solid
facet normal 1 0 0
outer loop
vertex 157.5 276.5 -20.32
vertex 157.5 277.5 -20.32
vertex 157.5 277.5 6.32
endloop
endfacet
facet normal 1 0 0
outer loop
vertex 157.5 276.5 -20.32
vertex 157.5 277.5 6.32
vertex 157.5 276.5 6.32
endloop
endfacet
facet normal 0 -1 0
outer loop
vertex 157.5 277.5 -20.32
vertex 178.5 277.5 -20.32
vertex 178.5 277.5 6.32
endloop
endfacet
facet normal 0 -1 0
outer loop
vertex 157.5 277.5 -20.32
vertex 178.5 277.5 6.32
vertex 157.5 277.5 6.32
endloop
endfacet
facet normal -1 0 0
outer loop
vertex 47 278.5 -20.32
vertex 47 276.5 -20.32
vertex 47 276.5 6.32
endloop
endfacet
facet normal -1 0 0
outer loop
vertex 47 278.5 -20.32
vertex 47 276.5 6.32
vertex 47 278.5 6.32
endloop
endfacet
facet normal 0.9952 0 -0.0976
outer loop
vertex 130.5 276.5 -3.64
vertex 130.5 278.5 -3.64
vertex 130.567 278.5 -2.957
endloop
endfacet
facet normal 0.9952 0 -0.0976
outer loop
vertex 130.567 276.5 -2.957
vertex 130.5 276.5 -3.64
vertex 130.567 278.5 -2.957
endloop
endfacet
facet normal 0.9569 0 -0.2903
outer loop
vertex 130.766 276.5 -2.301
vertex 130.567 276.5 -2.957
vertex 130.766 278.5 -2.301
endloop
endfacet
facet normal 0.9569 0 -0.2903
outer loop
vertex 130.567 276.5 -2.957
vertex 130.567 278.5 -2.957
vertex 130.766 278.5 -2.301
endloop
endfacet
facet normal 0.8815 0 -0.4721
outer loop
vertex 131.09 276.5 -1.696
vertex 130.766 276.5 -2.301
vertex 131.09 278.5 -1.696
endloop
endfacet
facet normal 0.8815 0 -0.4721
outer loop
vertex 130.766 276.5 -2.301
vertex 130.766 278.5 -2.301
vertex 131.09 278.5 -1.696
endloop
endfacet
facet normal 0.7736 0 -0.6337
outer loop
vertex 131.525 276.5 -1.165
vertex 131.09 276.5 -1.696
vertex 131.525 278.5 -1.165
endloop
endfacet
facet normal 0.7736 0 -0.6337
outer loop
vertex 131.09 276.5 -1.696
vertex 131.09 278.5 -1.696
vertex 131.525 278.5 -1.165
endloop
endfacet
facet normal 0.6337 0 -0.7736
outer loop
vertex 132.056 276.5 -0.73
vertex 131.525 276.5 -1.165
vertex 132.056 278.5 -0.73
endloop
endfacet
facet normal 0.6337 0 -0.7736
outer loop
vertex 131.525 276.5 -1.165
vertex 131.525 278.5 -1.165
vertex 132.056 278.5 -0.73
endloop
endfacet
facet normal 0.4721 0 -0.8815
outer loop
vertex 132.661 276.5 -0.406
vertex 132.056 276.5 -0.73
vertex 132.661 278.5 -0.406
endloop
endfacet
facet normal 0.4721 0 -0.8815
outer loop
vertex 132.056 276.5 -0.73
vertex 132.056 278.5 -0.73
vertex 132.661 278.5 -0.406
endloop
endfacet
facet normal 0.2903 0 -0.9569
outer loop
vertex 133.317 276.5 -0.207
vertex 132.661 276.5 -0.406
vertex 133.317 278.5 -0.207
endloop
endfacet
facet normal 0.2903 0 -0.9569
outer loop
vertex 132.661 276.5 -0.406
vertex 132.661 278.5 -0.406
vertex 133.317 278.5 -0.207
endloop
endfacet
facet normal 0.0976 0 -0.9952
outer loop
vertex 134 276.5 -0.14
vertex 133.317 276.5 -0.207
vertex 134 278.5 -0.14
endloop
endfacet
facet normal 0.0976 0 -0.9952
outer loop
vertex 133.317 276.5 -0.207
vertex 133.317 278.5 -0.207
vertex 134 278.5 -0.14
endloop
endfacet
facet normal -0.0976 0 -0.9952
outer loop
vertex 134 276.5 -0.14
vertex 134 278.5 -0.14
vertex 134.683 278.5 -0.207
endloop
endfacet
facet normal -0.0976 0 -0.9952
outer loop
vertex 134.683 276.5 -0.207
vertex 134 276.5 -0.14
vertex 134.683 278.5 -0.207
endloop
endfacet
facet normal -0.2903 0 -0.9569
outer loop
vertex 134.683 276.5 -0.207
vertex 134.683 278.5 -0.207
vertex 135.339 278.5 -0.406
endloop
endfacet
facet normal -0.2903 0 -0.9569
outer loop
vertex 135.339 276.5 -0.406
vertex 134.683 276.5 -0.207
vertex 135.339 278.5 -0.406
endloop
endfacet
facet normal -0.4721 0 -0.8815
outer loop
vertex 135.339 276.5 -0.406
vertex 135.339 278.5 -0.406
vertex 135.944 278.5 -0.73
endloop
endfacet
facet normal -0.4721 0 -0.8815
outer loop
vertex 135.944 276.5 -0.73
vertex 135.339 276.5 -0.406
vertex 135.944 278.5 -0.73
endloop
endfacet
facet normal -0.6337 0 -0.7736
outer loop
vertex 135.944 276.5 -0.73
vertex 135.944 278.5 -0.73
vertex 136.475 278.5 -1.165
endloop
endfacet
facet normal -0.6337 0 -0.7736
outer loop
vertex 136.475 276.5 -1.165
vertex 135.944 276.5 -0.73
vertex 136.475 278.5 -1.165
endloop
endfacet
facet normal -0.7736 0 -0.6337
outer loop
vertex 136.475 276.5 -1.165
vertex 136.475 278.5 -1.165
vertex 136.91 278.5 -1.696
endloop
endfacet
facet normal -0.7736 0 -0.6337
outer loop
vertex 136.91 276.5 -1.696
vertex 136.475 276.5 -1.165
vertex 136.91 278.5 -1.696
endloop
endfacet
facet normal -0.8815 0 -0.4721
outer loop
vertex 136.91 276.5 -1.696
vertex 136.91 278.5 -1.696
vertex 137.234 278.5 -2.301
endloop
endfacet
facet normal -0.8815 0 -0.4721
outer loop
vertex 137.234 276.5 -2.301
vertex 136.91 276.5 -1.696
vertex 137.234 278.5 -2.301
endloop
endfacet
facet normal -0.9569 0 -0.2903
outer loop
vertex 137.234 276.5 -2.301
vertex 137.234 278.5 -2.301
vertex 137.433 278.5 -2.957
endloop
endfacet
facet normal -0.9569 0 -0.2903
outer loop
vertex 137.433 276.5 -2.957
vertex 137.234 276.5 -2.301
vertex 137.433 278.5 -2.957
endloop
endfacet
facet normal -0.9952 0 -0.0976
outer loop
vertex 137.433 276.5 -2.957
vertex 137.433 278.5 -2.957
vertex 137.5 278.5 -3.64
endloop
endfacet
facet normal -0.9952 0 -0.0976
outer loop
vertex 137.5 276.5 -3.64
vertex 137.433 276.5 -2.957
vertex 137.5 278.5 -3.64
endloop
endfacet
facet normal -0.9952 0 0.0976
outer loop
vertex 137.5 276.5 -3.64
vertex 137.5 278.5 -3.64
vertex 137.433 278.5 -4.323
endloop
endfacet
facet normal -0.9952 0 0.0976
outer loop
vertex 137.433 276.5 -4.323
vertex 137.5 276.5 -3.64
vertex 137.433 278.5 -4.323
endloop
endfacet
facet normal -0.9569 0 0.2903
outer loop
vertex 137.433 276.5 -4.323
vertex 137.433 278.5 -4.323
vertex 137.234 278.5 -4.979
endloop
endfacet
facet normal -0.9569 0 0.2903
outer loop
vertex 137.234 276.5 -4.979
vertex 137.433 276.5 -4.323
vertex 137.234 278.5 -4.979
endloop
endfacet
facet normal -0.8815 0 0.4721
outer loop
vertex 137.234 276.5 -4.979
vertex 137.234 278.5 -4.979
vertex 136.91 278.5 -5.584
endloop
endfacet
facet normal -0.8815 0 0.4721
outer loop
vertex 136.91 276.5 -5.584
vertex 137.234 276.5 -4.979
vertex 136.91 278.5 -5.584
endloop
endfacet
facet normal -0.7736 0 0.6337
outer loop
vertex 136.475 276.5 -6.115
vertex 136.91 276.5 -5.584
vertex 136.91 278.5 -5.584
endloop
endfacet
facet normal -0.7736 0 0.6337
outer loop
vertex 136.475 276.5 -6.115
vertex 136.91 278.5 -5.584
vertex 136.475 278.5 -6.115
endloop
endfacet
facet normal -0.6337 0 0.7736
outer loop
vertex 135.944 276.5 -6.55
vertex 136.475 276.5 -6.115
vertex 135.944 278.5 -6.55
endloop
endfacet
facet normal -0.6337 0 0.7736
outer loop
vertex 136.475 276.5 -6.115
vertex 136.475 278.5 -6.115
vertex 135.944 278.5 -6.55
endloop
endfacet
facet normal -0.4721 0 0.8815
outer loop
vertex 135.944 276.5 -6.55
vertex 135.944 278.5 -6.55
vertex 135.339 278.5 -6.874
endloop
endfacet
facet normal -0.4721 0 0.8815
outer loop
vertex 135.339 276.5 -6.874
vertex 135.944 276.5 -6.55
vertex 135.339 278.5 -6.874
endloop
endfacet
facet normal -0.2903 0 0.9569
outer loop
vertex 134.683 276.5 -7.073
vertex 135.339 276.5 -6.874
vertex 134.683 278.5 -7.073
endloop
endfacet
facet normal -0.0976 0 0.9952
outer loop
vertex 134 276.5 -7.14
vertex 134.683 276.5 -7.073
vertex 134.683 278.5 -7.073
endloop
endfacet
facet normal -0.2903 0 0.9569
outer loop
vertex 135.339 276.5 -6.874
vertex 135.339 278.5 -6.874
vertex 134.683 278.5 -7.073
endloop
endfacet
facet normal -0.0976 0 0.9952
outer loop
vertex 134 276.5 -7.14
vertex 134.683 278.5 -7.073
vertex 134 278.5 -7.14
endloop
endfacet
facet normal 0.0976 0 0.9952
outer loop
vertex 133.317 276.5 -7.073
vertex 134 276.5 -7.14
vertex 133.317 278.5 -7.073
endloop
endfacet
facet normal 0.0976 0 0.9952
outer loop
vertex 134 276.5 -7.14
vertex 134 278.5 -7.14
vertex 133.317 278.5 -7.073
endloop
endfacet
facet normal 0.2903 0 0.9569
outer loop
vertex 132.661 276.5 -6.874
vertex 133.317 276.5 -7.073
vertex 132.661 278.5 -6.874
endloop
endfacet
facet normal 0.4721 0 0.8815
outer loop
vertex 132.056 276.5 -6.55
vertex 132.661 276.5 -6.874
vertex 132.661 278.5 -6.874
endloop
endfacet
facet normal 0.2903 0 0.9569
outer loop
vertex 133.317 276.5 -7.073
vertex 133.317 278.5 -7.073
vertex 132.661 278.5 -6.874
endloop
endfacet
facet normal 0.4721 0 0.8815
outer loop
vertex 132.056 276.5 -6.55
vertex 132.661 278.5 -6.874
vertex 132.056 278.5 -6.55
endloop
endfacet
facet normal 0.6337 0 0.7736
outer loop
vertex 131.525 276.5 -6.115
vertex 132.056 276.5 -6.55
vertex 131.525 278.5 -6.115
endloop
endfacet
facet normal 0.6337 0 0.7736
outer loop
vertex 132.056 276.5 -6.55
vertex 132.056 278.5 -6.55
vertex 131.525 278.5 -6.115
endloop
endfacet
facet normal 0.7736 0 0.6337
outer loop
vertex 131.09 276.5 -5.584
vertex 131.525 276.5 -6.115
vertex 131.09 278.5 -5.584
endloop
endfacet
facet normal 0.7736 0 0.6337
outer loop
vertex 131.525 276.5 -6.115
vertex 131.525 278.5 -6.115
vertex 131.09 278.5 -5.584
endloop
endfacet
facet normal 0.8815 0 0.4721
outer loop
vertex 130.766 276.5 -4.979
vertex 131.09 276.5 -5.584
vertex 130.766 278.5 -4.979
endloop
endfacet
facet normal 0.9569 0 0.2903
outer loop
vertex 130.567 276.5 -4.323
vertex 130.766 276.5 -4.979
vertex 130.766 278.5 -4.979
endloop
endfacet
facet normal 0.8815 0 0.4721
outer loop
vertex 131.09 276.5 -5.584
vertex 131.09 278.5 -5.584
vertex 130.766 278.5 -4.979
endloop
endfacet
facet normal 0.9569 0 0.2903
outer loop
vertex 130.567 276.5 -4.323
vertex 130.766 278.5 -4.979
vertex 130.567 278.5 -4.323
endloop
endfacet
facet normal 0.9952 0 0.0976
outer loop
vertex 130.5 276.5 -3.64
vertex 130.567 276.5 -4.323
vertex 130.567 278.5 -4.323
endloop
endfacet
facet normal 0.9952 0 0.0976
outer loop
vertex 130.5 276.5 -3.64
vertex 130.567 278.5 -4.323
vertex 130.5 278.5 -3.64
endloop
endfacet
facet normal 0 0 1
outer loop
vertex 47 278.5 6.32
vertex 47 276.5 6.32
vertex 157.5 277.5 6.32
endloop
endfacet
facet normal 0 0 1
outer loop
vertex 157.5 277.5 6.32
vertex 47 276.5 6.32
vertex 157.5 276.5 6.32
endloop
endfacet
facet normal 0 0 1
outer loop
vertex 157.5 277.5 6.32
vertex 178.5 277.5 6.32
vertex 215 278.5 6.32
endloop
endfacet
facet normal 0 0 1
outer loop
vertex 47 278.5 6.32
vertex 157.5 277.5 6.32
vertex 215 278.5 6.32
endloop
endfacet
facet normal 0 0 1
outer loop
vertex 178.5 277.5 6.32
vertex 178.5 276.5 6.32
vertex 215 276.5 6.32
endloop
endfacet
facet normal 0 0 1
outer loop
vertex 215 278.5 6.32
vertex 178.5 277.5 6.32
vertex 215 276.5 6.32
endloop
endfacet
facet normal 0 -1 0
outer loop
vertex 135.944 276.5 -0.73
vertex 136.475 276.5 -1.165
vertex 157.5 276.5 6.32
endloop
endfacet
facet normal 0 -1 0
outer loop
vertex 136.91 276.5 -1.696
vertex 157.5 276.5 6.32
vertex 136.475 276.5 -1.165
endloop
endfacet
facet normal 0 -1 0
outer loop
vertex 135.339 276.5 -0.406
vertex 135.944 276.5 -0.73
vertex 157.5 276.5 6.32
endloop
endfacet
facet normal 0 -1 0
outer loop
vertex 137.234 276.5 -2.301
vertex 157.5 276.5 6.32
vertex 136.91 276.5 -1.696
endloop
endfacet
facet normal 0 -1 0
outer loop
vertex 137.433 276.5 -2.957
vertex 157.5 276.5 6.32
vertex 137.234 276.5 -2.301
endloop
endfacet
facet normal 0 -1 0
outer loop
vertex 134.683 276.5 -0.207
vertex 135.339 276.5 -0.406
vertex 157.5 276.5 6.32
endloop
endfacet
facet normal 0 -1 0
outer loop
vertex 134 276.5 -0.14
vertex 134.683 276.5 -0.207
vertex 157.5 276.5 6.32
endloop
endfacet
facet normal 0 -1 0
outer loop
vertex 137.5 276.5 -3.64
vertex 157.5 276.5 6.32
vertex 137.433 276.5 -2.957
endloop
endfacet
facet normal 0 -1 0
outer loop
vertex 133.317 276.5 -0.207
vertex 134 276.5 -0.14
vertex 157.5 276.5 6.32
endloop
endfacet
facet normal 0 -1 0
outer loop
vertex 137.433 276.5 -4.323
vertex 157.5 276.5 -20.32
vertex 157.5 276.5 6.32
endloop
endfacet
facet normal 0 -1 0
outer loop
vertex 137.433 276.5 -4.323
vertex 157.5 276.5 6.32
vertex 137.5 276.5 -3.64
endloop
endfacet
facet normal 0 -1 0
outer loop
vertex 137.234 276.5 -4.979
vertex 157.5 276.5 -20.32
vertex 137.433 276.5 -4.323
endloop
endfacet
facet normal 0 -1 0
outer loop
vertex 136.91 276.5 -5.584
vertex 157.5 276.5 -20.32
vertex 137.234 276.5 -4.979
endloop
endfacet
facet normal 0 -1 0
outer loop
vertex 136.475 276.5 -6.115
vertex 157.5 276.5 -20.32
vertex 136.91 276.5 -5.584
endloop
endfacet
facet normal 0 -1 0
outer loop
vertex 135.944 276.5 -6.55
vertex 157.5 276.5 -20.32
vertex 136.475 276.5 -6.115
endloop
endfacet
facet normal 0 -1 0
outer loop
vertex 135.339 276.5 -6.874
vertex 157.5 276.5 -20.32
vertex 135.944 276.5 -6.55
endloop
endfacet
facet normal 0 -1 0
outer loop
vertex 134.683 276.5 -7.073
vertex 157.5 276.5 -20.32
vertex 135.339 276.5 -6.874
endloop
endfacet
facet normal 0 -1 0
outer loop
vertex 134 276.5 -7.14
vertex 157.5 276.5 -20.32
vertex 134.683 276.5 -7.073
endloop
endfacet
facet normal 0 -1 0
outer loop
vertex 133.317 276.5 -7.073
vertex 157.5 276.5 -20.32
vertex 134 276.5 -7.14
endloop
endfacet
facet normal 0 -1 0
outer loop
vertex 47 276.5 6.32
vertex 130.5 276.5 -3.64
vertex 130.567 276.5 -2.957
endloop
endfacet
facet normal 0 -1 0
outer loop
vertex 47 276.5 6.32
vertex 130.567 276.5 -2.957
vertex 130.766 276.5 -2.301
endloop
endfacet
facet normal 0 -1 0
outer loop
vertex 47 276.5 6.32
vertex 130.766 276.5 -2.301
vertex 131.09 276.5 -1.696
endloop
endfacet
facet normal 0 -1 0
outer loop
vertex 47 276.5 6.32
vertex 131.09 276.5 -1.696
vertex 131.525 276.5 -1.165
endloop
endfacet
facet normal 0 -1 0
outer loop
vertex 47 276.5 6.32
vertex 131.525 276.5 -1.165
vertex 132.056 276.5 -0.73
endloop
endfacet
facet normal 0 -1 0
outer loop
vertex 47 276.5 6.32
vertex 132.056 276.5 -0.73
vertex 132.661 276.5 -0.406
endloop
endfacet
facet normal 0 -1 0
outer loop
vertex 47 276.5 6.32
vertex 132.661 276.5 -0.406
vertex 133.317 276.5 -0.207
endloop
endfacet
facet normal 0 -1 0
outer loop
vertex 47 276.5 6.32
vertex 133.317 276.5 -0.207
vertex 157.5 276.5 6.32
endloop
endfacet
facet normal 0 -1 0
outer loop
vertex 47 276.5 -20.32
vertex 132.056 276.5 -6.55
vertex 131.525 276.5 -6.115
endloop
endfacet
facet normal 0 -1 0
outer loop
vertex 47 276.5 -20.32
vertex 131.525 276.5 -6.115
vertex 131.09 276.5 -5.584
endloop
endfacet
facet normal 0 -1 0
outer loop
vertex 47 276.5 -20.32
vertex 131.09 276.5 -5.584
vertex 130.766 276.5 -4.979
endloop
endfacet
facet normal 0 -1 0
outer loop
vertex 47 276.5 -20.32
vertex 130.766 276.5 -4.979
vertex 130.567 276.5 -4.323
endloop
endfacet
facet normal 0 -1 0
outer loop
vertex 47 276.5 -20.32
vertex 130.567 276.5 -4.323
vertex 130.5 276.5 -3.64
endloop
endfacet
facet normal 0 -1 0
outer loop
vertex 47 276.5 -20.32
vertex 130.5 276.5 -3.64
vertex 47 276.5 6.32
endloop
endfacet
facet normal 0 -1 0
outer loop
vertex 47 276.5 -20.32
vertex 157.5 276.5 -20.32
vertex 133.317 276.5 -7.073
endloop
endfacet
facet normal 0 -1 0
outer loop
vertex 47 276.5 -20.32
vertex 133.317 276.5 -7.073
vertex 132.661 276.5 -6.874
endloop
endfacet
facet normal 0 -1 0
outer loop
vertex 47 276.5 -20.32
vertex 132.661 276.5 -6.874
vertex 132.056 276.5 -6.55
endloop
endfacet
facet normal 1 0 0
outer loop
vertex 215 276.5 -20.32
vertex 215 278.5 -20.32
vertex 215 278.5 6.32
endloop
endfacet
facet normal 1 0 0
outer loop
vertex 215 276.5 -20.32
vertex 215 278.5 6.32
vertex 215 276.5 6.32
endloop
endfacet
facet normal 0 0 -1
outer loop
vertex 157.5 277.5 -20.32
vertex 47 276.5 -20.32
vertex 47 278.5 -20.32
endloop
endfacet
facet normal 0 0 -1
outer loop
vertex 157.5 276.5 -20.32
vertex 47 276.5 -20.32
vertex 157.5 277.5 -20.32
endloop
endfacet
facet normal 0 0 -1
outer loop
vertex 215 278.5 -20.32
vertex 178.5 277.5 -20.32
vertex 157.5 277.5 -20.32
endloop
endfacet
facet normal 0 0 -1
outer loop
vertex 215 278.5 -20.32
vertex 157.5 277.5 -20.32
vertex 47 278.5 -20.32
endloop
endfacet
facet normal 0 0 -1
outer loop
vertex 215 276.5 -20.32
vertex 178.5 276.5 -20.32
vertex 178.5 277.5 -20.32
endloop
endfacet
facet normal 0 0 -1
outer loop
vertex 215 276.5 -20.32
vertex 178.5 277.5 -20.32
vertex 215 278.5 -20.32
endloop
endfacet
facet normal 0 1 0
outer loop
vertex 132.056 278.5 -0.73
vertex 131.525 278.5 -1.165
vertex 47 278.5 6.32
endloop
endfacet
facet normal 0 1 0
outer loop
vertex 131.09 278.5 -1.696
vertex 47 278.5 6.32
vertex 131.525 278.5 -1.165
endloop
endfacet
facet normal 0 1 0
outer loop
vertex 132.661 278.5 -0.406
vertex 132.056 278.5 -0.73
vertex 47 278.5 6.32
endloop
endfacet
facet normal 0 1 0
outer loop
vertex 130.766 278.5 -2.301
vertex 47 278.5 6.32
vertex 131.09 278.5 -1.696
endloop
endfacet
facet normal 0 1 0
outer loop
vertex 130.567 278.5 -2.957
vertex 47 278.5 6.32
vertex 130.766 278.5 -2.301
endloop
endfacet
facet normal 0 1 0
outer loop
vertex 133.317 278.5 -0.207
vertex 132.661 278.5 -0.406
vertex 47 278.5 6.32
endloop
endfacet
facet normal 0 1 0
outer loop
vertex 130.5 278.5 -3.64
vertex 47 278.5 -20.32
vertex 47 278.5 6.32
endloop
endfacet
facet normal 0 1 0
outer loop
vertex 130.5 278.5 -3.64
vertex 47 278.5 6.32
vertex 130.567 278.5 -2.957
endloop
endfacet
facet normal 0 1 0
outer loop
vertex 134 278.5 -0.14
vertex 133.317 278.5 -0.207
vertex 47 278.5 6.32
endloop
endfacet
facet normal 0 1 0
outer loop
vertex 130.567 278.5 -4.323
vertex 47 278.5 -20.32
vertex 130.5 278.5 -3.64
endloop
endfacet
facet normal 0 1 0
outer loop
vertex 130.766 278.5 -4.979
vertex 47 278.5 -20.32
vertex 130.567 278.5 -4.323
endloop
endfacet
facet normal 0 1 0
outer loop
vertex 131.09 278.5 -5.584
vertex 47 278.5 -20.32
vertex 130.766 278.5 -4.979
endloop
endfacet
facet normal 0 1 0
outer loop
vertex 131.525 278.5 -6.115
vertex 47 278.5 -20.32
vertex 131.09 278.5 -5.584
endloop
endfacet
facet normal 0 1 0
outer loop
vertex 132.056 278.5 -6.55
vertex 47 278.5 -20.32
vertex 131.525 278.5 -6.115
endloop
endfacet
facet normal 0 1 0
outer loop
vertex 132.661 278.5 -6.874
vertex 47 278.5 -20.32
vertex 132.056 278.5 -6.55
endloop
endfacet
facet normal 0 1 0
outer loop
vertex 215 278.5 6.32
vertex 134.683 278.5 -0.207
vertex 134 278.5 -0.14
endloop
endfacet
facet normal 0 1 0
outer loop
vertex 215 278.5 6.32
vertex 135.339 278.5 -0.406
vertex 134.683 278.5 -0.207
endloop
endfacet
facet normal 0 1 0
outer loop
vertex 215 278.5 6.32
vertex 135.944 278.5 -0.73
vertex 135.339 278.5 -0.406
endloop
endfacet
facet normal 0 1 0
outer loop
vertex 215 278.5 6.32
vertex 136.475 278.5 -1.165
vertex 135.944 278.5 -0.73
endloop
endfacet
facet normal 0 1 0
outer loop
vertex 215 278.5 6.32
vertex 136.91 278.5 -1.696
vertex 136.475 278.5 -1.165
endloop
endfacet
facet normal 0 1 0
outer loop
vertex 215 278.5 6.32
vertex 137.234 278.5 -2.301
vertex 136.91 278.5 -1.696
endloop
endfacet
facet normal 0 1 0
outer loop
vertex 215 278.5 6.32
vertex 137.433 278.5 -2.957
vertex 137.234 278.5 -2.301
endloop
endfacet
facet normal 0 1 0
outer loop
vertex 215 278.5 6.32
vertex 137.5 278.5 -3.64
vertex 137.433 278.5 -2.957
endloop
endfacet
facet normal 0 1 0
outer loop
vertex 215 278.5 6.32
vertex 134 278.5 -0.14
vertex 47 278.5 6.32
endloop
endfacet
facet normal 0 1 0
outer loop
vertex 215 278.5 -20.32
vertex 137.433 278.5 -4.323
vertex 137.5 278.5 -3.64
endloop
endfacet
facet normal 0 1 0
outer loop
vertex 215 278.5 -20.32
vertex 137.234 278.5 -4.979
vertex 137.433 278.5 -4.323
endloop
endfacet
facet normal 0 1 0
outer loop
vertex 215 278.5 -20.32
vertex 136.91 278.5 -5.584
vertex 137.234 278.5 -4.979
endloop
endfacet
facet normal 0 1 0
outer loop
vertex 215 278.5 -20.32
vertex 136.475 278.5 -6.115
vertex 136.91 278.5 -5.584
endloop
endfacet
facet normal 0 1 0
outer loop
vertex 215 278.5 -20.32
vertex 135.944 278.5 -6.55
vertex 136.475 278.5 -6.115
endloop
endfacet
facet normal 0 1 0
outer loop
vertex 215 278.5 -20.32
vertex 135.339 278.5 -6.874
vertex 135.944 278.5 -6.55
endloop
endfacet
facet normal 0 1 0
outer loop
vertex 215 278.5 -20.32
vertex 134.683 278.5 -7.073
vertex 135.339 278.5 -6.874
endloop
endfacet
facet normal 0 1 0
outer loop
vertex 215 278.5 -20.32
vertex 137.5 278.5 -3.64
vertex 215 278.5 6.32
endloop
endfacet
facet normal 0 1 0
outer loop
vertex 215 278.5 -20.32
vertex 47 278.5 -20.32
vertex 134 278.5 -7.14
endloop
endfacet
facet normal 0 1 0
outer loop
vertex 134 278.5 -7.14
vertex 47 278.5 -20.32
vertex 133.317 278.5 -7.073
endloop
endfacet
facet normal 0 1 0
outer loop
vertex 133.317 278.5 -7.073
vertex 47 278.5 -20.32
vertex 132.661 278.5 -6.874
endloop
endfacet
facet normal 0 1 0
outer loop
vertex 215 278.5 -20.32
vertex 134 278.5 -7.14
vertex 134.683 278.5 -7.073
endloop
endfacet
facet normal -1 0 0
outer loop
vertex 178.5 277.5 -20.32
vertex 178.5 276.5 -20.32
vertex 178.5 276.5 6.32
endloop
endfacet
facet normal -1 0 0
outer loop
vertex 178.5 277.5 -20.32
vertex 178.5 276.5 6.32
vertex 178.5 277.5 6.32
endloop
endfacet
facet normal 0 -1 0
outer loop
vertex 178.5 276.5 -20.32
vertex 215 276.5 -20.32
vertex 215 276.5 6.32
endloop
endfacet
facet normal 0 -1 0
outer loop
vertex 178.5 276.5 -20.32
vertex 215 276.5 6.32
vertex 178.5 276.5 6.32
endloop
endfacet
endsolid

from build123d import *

# Parameters (mm, degrees)
SKETCH157_R      = 3.5
EXTRUDE147_DEPTH = 10
EXTRUDE097_DEPTH = 26.64


with BuildPart() as extrude147:
    # Sketch157 → Extrude147 (new body)
    with BuildSketch(Plane(origin=(0, 280, 0), x_dir=(-1, 0, 0), z_dir=(0, 1, 0))):
        with Locations((-134, -3.64)):
            Circle(SKETCH157_R)
    extrude(amount=-EXTRUDE147_DEPTH)


with BuildPart() as battery_side:
    # Sketch106 → Extrude097 (new body)
    with BuildSketch(Plane(origin=(0, 0, -20.32), x_dir=(1, 0, 0), z_dir=(0, 0, -1))):
        Polygon((47, -278.5), (215, -278.5), (215, -276.5), (178.5, -276.5), (178.5, -277.5), (157.5, -277.5), (157.5, -276.5), (47, -276.5), align=None)
    extrude(amount=-EXTRUDE097_DEPTH)

    # Cut017: cut Extrude147
    add(extrude147.part, mode=Mode.SUBTRACT)


solid = battery_side.part
